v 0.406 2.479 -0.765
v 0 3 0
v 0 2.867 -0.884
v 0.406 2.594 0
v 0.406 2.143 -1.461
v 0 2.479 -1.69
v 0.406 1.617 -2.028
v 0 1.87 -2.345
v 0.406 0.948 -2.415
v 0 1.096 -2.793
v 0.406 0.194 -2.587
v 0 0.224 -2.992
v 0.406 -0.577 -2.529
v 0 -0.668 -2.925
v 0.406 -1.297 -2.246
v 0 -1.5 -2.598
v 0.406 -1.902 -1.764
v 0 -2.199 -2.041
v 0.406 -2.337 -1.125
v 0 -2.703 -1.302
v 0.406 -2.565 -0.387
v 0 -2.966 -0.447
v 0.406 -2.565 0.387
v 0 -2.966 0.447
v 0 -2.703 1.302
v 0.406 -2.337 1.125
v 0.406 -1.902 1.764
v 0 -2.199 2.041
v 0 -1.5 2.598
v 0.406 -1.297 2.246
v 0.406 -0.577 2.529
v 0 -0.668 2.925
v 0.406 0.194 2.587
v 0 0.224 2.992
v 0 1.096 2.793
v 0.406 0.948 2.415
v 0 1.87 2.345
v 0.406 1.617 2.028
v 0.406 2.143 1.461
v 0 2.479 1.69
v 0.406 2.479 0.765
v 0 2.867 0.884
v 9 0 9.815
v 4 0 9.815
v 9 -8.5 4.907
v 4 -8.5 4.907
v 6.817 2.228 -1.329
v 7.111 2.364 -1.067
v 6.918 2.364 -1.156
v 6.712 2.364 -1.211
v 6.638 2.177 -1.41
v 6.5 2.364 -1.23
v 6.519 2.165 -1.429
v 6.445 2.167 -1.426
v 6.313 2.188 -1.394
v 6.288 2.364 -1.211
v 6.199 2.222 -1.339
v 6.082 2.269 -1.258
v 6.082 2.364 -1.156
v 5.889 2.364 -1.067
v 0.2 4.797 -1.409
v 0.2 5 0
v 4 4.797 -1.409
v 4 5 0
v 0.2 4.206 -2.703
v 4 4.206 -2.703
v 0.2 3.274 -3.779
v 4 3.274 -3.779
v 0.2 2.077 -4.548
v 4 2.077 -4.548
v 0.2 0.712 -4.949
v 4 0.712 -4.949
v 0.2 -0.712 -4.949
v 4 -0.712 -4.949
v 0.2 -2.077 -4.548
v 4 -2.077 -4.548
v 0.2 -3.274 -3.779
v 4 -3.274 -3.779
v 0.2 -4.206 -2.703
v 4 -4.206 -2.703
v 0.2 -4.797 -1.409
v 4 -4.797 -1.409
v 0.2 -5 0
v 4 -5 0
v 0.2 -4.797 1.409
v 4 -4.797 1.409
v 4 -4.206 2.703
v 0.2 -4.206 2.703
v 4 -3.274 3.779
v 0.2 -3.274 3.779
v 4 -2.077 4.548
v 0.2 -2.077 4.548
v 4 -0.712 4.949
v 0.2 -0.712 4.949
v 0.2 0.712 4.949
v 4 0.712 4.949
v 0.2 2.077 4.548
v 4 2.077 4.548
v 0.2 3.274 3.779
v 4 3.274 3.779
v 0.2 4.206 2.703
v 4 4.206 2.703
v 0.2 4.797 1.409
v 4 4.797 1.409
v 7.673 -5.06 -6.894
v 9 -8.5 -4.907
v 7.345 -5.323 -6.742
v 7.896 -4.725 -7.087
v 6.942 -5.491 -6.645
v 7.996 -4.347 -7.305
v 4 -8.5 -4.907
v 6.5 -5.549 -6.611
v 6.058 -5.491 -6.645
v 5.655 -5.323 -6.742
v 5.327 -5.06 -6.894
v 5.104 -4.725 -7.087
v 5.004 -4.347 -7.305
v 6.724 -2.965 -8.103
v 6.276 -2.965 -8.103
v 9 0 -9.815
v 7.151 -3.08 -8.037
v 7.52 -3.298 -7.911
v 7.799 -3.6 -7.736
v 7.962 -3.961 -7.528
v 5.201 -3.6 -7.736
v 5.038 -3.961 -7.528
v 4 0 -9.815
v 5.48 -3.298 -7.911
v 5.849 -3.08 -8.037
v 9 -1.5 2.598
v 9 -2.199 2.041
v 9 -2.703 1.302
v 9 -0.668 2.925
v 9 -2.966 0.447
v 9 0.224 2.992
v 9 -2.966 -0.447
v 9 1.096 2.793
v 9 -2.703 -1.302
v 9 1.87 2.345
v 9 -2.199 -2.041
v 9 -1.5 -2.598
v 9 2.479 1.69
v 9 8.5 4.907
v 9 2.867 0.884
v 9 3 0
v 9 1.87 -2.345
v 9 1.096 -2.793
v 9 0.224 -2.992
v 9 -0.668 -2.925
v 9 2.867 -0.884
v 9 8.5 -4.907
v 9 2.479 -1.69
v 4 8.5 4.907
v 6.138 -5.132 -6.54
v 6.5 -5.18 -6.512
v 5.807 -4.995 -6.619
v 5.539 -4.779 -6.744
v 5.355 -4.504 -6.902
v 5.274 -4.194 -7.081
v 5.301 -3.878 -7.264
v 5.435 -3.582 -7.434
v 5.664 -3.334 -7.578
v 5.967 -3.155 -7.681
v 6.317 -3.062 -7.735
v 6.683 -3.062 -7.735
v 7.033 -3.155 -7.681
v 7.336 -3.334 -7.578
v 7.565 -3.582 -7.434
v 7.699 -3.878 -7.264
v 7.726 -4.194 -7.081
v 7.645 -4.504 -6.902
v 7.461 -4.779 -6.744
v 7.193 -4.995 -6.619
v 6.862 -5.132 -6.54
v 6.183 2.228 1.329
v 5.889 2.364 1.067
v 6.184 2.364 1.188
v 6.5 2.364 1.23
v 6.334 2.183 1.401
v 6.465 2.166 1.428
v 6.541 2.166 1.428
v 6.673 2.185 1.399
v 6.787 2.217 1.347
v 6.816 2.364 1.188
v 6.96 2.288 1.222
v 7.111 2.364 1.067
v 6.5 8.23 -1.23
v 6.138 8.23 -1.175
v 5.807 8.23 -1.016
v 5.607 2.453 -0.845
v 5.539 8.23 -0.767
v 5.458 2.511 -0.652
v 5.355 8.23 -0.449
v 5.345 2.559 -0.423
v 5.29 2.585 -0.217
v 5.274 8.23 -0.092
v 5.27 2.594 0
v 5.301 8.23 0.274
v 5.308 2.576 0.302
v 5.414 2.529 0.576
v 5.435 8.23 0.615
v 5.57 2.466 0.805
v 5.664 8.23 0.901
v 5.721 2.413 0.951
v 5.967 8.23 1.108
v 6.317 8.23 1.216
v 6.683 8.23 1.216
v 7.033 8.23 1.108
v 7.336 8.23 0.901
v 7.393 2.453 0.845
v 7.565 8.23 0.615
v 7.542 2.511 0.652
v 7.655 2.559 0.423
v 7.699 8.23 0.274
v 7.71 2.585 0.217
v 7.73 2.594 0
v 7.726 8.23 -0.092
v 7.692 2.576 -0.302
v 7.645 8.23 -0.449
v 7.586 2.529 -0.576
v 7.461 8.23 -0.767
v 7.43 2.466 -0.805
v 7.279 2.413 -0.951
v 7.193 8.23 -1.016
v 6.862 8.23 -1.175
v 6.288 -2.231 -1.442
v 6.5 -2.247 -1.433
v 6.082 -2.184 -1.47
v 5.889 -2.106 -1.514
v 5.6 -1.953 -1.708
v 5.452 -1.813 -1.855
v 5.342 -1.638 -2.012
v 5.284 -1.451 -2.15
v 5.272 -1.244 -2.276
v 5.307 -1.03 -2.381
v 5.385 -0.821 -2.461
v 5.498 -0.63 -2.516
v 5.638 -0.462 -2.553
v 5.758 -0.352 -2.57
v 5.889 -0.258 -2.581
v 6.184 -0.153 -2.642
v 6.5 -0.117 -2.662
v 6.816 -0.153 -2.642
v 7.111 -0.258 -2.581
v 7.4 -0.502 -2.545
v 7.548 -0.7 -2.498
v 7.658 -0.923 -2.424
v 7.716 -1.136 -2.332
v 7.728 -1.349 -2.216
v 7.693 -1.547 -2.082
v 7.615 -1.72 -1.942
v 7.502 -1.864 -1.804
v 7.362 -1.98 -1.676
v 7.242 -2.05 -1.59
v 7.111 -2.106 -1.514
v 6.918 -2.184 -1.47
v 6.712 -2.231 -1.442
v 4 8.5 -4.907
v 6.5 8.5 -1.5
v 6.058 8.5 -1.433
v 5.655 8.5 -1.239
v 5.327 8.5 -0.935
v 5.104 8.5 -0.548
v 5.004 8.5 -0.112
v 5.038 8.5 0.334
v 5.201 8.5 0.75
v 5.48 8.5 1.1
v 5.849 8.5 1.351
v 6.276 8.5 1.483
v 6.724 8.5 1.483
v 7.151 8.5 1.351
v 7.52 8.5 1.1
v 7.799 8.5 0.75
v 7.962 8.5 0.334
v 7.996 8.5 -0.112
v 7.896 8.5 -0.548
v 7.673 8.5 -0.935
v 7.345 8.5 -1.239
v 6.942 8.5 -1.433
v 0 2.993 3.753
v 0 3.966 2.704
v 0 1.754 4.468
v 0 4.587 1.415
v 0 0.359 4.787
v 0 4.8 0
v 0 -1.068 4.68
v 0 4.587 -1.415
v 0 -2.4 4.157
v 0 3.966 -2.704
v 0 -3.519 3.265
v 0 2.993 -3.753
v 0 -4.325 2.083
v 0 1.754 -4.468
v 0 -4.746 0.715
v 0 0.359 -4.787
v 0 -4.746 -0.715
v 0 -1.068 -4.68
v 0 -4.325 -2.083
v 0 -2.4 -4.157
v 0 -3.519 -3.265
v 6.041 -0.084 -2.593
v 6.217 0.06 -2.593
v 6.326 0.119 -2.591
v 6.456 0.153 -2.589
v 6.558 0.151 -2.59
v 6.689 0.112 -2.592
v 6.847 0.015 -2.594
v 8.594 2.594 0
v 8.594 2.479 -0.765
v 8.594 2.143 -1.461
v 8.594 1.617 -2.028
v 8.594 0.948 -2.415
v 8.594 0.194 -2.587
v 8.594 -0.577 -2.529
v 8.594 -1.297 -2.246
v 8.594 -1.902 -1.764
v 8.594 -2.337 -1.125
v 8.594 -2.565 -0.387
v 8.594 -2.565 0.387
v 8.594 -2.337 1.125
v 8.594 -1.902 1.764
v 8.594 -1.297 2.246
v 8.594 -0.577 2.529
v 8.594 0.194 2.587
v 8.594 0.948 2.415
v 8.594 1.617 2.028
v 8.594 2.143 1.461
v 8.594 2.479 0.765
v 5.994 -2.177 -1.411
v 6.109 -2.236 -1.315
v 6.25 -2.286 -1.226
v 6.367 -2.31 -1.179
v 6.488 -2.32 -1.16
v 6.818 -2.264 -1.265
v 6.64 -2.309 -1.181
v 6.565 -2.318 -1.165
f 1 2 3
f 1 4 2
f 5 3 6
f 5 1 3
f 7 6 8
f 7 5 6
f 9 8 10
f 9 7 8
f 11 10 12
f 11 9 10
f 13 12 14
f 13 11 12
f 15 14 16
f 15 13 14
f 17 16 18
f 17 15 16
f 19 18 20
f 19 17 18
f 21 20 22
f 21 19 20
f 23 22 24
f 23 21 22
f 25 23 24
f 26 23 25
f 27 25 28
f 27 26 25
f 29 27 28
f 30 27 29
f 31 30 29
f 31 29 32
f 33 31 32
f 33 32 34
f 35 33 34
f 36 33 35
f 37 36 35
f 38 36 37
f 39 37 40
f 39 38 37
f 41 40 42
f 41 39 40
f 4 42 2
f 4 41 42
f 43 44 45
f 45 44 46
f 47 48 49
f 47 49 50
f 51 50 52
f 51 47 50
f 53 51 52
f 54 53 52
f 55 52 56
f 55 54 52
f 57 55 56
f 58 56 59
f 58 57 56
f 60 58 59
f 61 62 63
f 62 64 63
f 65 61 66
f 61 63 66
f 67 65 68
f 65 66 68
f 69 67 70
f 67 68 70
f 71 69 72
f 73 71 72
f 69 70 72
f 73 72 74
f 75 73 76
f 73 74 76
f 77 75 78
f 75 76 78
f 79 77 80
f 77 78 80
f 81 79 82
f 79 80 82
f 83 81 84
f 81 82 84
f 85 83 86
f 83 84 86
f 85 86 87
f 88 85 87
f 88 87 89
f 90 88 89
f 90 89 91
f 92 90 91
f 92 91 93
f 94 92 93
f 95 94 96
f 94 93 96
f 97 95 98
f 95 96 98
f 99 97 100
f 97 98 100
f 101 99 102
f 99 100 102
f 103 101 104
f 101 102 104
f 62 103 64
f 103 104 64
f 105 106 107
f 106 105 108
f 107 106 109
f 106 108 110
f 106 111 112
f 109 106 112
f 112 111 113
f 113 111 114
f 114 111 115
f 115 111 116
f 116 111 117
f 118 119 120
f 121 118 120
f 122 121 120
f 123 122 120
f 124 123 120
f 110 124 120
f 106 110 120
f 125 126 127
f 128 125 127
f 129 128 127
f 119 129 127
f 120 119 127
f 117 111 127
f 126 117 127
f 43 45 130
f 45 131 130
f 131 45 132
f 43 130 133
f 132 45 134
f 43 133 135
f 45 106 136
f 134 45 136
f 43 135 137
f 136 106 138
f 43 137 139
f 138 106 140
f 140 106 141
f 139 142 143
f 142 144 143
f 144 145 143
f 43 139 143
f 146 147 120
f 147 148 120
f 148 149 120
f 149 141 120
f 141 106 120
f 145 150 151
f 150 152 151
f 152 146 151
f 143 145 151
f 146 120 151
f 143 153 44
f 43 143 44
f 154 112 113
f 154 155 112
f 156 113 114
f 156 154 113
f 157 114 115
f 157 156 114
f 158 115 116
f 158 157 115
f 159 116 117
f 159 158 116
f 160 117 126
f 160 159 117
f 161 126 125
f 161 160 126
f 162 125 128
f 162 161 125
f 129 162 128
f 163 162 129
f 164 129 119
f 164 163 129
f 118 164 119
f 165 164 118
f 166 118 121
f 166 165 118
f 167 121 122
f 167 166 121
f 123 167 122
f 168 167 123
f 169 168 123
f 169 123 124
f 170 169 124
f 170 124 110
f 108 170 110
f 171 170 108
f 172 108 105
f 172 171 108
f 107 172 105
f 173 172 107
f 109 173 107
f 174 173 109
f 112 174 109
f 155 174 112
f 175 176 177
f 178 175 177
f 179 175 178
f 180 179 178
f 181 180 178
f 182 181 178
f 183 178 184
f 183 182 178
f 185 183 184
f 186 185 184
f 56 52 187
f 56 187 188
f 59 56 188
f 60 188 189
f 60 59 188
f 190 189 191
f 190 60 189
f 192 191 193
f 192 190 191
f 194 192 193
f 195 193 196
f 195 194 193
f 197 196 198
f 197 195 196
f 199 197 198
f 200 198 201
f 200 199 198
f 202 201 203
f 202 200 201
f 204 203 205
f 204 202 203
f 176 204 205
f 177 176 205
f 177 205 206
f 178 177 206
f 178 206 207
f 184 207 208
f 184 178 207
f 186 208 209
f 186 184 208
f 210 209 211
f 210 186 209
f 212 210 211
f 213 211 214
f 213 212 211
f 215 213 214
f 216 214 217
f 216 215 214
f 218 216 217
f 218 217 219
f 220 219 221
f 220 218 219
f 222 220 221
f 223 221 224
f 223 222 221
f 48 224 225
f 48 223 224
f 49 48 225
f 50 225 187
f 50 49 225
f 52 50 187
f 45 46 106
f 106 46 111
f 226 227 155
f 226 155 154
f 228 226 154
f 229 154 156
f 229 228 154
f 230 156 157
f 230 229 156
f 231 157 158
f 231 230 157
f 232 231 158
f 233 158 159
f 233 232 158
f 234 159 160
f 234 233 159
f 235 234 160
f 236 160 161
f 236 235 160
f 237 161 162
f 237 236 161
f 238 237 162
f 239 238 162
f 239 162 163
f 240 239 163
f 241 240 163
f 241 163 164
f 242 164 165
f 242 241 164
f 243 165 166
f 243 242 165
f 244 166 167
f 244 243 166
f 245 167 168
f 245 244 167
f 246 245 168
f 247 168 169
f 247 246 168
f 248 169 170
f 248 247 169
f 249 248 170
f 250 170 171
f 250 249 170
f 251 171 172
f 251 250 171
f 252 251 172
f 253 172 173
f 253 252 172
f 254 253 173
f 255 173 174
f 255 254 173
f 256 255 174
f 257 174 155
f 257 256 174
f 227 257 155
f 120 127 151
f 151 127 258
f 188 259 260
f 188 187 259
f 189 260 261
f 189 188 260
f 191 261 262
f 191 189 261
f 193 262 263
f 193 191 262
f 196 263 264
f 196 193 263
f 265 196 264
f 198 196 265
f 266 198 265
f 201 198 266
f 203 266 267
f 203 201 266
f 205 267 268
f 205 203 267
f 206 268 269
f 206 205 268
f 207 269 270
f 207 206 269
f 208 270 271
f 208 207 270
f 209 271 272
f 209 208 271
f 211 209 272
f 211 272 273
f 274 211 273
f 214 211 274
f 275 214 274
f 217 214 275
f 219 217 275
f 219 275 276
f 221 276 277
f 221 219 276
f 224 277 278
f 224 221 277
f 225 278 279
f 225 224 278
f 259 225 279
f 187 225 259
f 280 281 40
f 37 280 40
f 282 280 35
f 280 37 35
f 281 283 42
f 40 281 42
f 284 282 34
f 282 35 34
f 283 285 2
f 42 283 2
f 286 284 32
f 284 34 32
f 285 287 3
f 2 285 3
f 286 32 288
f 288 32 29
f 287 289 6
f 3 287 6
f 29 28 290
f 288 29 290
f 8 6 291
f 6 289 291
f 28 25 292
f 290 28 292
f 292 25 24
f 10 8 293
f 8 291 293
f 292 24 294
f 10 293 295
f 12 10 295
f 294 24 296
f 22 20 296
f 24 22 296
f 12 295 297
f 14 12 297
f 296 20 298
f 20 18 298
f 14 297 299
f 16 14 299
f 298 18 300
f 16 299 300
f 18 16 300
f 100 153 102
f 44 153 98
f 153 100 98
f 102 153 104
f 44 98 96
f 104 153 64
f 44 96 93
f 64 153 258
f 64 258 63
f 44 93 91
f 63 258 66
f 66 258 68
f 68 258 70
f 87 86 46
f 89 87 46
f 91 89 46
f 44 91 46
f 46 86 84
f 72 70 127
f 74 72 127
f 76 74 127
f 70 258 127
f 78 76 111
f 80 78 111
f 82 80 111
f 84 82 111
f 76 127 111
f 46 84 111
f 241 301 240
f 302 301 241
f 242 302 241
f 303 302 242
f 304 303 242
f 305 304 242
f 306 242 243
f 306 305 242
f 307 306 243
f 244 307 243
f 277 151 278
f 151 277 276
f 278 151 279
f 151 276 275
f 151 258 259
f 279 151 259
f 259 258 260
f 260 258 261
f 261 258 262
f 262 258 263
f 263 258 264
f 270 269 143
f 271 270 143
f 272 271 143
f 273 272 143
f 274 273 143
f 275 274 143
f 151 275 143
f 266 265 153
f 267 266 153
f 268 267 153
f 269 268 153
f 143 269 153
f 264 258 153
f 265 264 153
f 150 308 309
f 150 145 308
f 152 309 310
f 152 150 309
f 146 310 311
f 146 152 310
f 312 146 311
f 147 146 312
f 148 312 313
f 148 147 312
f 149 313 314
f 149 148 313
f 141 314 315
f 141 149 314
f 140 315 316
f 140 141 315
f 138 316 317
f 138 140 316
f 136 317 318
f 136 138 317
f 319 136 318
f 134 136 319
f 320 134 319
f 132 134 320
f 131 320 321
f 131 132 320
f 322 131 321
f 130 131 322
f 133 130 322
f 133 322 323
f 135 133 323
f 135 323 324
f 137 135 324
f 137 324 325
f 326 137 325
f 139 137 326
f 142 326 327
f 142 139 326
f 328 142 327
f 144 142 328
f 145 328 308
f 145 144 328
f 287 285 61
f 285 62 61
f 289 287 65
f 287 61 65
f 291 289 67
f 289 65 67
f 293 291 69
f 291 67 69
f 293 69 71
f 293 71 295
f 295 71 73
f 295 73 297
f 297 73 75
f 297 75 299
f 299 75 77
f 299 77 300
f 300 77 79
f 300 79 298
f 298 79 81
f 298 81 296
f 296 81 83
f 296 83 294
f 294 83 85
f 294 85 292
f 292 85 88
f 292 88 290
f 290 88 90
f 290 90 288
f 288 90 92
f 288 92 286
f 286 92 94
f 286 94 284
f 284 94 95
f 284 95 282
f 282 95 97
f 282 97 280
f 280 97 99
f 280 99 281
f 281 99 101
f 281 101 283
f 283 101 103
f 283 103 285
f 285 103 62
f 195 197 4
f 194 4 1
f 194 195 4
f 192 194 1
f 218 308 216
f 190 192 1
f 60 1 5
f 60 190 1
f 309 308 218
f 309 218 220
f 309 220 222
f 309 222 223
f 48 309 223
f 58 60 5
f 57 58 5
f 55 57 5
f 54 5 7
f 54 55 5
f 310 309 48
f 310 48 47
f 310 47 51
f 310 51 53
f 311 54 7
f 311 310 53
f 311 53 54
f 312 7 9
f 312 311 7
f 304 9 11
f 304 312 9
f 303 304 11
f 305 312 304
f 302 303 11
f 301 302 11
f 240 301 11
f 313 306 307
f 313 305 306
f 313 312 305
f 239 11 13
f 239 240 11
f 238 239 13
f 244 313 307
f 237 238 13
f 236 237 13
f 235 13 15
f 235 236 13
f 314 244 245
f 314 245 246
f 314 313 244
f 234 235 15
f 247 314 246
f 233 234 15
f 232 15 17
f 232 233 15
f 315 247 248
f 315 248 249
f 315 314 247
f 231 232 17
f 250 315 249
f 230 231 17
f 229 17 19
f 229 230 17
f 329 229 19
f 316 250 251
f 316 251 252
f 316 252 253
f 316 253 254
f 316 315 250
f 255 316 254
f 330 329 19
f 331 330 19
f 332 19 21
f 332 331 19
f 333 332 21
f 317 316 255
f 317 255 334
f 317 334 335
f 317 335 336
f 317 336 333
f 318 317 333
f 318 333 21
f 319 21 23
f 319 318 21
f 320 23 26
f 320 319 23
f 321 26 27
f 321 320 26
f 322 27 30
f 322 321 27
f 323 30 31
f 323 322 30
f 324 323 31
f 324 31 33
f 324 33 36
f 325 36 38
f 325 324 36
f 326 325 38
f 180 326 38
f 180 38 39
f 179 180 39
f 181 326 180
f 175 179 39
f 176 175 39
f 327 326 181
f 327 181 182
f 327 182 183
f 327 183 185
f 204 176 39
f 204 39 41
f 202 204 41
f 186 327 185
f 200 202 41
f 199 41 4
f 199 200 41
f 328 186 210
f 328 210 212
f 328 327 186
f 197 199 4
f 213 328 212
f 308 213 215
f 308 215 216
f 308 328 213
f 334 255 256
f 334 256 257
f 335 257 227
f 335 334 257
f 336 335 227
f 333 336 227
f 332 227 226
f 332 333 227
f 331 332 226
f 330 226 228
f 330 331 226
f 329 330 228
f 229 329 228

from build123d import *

# Parameters (mm, degrees)
SKETCH3_W          = 34
SKETCH3_H          = 34
CUT_EXTRUDE1_DEPTH = 9


with BuildPart() as part:
    # Sketch1 → Revolve1 (revolve)
    with BuildSketch(Plane.XY):
        Polygon((0, 0), (0, 4.8), (0.2, 5), (4, 5), (4, 10.2), (9, 10.2), (9, 0), align=None)
    revolve(axis=Axis((9, 0, 0), (-1, 0, 0)))

    # Sketch2 → Cut-Revolve1 (revolve, cut)
    with BuildSketch(Plane.XY):
        Polygon((0, 0), (0, 3), (0.406, 2.594), (8.594, 2.594), (9, 3), (9, 0), align=None)
    revolve(axis=Axis((9, 0, 0), (-1, 0, 0)), mode=Mode.SUBTRACT)

    # Sketch3 → Cut-Extrude1 (cut)
    with BuildSketch(Plane(origin=(0, 0, 0), x_dir=(0, 0, -1), z_dir=(1, 0, 0))):
        Rectangle(SKETCH3_W, SKETCH3_H)
        Polygon((-9.814954576, 0), (-4.907477288, -8.5), (4.907477288, -8.5), (9.814954576, 0), (4.907477288, 8.5), (-4.907477288, 8.5), align=None, mode=Mode.SUBTRACT)
    extrude(amount=CUT_EXTRUDE1_DEPTH, mode=Mode.SUBTRACT)

    # Sketch4 → Cut-Revolve2 (revolve, cut)
    with BuildSketch(Plane(origin=(6.5, 0, 0), x_dir=(0, 0, -1), z_dir=(1, 0, 0))):
        Polygon((0, 8.5), (1.5, 8.5), (1.2295, 8.2295), (1.2295, 2.3645), (1.5, 2.094), (0, 2.094), align=None)
    revolve(axis=Axis((6.5, 2.094, 0), (0, 1, 0)), mode=Mode.SUBTRACT)

    # Sketch5 → Cut-Revolve3 (revolve, cut)
    with BuildSketch(Plane(origin=(6.5, 0, 0), x_dir=(0, 0, -1), z_dir=(1, 0, 0))):
        Polygon((7.361215932, -4.25), (6.611215932, -5.549038106), (6.51220606, -5.179528234), (1.432967067, -2.247028234), (1.063457196, -2.346038106), (1.813457196, -1.047), align=None)
    revolve(axis=Axis((6.5, -1.047, -1.813457196), (0, -0.5, -0.866025404)), mode=Mode.SUBTRACT)


solid = part.part
